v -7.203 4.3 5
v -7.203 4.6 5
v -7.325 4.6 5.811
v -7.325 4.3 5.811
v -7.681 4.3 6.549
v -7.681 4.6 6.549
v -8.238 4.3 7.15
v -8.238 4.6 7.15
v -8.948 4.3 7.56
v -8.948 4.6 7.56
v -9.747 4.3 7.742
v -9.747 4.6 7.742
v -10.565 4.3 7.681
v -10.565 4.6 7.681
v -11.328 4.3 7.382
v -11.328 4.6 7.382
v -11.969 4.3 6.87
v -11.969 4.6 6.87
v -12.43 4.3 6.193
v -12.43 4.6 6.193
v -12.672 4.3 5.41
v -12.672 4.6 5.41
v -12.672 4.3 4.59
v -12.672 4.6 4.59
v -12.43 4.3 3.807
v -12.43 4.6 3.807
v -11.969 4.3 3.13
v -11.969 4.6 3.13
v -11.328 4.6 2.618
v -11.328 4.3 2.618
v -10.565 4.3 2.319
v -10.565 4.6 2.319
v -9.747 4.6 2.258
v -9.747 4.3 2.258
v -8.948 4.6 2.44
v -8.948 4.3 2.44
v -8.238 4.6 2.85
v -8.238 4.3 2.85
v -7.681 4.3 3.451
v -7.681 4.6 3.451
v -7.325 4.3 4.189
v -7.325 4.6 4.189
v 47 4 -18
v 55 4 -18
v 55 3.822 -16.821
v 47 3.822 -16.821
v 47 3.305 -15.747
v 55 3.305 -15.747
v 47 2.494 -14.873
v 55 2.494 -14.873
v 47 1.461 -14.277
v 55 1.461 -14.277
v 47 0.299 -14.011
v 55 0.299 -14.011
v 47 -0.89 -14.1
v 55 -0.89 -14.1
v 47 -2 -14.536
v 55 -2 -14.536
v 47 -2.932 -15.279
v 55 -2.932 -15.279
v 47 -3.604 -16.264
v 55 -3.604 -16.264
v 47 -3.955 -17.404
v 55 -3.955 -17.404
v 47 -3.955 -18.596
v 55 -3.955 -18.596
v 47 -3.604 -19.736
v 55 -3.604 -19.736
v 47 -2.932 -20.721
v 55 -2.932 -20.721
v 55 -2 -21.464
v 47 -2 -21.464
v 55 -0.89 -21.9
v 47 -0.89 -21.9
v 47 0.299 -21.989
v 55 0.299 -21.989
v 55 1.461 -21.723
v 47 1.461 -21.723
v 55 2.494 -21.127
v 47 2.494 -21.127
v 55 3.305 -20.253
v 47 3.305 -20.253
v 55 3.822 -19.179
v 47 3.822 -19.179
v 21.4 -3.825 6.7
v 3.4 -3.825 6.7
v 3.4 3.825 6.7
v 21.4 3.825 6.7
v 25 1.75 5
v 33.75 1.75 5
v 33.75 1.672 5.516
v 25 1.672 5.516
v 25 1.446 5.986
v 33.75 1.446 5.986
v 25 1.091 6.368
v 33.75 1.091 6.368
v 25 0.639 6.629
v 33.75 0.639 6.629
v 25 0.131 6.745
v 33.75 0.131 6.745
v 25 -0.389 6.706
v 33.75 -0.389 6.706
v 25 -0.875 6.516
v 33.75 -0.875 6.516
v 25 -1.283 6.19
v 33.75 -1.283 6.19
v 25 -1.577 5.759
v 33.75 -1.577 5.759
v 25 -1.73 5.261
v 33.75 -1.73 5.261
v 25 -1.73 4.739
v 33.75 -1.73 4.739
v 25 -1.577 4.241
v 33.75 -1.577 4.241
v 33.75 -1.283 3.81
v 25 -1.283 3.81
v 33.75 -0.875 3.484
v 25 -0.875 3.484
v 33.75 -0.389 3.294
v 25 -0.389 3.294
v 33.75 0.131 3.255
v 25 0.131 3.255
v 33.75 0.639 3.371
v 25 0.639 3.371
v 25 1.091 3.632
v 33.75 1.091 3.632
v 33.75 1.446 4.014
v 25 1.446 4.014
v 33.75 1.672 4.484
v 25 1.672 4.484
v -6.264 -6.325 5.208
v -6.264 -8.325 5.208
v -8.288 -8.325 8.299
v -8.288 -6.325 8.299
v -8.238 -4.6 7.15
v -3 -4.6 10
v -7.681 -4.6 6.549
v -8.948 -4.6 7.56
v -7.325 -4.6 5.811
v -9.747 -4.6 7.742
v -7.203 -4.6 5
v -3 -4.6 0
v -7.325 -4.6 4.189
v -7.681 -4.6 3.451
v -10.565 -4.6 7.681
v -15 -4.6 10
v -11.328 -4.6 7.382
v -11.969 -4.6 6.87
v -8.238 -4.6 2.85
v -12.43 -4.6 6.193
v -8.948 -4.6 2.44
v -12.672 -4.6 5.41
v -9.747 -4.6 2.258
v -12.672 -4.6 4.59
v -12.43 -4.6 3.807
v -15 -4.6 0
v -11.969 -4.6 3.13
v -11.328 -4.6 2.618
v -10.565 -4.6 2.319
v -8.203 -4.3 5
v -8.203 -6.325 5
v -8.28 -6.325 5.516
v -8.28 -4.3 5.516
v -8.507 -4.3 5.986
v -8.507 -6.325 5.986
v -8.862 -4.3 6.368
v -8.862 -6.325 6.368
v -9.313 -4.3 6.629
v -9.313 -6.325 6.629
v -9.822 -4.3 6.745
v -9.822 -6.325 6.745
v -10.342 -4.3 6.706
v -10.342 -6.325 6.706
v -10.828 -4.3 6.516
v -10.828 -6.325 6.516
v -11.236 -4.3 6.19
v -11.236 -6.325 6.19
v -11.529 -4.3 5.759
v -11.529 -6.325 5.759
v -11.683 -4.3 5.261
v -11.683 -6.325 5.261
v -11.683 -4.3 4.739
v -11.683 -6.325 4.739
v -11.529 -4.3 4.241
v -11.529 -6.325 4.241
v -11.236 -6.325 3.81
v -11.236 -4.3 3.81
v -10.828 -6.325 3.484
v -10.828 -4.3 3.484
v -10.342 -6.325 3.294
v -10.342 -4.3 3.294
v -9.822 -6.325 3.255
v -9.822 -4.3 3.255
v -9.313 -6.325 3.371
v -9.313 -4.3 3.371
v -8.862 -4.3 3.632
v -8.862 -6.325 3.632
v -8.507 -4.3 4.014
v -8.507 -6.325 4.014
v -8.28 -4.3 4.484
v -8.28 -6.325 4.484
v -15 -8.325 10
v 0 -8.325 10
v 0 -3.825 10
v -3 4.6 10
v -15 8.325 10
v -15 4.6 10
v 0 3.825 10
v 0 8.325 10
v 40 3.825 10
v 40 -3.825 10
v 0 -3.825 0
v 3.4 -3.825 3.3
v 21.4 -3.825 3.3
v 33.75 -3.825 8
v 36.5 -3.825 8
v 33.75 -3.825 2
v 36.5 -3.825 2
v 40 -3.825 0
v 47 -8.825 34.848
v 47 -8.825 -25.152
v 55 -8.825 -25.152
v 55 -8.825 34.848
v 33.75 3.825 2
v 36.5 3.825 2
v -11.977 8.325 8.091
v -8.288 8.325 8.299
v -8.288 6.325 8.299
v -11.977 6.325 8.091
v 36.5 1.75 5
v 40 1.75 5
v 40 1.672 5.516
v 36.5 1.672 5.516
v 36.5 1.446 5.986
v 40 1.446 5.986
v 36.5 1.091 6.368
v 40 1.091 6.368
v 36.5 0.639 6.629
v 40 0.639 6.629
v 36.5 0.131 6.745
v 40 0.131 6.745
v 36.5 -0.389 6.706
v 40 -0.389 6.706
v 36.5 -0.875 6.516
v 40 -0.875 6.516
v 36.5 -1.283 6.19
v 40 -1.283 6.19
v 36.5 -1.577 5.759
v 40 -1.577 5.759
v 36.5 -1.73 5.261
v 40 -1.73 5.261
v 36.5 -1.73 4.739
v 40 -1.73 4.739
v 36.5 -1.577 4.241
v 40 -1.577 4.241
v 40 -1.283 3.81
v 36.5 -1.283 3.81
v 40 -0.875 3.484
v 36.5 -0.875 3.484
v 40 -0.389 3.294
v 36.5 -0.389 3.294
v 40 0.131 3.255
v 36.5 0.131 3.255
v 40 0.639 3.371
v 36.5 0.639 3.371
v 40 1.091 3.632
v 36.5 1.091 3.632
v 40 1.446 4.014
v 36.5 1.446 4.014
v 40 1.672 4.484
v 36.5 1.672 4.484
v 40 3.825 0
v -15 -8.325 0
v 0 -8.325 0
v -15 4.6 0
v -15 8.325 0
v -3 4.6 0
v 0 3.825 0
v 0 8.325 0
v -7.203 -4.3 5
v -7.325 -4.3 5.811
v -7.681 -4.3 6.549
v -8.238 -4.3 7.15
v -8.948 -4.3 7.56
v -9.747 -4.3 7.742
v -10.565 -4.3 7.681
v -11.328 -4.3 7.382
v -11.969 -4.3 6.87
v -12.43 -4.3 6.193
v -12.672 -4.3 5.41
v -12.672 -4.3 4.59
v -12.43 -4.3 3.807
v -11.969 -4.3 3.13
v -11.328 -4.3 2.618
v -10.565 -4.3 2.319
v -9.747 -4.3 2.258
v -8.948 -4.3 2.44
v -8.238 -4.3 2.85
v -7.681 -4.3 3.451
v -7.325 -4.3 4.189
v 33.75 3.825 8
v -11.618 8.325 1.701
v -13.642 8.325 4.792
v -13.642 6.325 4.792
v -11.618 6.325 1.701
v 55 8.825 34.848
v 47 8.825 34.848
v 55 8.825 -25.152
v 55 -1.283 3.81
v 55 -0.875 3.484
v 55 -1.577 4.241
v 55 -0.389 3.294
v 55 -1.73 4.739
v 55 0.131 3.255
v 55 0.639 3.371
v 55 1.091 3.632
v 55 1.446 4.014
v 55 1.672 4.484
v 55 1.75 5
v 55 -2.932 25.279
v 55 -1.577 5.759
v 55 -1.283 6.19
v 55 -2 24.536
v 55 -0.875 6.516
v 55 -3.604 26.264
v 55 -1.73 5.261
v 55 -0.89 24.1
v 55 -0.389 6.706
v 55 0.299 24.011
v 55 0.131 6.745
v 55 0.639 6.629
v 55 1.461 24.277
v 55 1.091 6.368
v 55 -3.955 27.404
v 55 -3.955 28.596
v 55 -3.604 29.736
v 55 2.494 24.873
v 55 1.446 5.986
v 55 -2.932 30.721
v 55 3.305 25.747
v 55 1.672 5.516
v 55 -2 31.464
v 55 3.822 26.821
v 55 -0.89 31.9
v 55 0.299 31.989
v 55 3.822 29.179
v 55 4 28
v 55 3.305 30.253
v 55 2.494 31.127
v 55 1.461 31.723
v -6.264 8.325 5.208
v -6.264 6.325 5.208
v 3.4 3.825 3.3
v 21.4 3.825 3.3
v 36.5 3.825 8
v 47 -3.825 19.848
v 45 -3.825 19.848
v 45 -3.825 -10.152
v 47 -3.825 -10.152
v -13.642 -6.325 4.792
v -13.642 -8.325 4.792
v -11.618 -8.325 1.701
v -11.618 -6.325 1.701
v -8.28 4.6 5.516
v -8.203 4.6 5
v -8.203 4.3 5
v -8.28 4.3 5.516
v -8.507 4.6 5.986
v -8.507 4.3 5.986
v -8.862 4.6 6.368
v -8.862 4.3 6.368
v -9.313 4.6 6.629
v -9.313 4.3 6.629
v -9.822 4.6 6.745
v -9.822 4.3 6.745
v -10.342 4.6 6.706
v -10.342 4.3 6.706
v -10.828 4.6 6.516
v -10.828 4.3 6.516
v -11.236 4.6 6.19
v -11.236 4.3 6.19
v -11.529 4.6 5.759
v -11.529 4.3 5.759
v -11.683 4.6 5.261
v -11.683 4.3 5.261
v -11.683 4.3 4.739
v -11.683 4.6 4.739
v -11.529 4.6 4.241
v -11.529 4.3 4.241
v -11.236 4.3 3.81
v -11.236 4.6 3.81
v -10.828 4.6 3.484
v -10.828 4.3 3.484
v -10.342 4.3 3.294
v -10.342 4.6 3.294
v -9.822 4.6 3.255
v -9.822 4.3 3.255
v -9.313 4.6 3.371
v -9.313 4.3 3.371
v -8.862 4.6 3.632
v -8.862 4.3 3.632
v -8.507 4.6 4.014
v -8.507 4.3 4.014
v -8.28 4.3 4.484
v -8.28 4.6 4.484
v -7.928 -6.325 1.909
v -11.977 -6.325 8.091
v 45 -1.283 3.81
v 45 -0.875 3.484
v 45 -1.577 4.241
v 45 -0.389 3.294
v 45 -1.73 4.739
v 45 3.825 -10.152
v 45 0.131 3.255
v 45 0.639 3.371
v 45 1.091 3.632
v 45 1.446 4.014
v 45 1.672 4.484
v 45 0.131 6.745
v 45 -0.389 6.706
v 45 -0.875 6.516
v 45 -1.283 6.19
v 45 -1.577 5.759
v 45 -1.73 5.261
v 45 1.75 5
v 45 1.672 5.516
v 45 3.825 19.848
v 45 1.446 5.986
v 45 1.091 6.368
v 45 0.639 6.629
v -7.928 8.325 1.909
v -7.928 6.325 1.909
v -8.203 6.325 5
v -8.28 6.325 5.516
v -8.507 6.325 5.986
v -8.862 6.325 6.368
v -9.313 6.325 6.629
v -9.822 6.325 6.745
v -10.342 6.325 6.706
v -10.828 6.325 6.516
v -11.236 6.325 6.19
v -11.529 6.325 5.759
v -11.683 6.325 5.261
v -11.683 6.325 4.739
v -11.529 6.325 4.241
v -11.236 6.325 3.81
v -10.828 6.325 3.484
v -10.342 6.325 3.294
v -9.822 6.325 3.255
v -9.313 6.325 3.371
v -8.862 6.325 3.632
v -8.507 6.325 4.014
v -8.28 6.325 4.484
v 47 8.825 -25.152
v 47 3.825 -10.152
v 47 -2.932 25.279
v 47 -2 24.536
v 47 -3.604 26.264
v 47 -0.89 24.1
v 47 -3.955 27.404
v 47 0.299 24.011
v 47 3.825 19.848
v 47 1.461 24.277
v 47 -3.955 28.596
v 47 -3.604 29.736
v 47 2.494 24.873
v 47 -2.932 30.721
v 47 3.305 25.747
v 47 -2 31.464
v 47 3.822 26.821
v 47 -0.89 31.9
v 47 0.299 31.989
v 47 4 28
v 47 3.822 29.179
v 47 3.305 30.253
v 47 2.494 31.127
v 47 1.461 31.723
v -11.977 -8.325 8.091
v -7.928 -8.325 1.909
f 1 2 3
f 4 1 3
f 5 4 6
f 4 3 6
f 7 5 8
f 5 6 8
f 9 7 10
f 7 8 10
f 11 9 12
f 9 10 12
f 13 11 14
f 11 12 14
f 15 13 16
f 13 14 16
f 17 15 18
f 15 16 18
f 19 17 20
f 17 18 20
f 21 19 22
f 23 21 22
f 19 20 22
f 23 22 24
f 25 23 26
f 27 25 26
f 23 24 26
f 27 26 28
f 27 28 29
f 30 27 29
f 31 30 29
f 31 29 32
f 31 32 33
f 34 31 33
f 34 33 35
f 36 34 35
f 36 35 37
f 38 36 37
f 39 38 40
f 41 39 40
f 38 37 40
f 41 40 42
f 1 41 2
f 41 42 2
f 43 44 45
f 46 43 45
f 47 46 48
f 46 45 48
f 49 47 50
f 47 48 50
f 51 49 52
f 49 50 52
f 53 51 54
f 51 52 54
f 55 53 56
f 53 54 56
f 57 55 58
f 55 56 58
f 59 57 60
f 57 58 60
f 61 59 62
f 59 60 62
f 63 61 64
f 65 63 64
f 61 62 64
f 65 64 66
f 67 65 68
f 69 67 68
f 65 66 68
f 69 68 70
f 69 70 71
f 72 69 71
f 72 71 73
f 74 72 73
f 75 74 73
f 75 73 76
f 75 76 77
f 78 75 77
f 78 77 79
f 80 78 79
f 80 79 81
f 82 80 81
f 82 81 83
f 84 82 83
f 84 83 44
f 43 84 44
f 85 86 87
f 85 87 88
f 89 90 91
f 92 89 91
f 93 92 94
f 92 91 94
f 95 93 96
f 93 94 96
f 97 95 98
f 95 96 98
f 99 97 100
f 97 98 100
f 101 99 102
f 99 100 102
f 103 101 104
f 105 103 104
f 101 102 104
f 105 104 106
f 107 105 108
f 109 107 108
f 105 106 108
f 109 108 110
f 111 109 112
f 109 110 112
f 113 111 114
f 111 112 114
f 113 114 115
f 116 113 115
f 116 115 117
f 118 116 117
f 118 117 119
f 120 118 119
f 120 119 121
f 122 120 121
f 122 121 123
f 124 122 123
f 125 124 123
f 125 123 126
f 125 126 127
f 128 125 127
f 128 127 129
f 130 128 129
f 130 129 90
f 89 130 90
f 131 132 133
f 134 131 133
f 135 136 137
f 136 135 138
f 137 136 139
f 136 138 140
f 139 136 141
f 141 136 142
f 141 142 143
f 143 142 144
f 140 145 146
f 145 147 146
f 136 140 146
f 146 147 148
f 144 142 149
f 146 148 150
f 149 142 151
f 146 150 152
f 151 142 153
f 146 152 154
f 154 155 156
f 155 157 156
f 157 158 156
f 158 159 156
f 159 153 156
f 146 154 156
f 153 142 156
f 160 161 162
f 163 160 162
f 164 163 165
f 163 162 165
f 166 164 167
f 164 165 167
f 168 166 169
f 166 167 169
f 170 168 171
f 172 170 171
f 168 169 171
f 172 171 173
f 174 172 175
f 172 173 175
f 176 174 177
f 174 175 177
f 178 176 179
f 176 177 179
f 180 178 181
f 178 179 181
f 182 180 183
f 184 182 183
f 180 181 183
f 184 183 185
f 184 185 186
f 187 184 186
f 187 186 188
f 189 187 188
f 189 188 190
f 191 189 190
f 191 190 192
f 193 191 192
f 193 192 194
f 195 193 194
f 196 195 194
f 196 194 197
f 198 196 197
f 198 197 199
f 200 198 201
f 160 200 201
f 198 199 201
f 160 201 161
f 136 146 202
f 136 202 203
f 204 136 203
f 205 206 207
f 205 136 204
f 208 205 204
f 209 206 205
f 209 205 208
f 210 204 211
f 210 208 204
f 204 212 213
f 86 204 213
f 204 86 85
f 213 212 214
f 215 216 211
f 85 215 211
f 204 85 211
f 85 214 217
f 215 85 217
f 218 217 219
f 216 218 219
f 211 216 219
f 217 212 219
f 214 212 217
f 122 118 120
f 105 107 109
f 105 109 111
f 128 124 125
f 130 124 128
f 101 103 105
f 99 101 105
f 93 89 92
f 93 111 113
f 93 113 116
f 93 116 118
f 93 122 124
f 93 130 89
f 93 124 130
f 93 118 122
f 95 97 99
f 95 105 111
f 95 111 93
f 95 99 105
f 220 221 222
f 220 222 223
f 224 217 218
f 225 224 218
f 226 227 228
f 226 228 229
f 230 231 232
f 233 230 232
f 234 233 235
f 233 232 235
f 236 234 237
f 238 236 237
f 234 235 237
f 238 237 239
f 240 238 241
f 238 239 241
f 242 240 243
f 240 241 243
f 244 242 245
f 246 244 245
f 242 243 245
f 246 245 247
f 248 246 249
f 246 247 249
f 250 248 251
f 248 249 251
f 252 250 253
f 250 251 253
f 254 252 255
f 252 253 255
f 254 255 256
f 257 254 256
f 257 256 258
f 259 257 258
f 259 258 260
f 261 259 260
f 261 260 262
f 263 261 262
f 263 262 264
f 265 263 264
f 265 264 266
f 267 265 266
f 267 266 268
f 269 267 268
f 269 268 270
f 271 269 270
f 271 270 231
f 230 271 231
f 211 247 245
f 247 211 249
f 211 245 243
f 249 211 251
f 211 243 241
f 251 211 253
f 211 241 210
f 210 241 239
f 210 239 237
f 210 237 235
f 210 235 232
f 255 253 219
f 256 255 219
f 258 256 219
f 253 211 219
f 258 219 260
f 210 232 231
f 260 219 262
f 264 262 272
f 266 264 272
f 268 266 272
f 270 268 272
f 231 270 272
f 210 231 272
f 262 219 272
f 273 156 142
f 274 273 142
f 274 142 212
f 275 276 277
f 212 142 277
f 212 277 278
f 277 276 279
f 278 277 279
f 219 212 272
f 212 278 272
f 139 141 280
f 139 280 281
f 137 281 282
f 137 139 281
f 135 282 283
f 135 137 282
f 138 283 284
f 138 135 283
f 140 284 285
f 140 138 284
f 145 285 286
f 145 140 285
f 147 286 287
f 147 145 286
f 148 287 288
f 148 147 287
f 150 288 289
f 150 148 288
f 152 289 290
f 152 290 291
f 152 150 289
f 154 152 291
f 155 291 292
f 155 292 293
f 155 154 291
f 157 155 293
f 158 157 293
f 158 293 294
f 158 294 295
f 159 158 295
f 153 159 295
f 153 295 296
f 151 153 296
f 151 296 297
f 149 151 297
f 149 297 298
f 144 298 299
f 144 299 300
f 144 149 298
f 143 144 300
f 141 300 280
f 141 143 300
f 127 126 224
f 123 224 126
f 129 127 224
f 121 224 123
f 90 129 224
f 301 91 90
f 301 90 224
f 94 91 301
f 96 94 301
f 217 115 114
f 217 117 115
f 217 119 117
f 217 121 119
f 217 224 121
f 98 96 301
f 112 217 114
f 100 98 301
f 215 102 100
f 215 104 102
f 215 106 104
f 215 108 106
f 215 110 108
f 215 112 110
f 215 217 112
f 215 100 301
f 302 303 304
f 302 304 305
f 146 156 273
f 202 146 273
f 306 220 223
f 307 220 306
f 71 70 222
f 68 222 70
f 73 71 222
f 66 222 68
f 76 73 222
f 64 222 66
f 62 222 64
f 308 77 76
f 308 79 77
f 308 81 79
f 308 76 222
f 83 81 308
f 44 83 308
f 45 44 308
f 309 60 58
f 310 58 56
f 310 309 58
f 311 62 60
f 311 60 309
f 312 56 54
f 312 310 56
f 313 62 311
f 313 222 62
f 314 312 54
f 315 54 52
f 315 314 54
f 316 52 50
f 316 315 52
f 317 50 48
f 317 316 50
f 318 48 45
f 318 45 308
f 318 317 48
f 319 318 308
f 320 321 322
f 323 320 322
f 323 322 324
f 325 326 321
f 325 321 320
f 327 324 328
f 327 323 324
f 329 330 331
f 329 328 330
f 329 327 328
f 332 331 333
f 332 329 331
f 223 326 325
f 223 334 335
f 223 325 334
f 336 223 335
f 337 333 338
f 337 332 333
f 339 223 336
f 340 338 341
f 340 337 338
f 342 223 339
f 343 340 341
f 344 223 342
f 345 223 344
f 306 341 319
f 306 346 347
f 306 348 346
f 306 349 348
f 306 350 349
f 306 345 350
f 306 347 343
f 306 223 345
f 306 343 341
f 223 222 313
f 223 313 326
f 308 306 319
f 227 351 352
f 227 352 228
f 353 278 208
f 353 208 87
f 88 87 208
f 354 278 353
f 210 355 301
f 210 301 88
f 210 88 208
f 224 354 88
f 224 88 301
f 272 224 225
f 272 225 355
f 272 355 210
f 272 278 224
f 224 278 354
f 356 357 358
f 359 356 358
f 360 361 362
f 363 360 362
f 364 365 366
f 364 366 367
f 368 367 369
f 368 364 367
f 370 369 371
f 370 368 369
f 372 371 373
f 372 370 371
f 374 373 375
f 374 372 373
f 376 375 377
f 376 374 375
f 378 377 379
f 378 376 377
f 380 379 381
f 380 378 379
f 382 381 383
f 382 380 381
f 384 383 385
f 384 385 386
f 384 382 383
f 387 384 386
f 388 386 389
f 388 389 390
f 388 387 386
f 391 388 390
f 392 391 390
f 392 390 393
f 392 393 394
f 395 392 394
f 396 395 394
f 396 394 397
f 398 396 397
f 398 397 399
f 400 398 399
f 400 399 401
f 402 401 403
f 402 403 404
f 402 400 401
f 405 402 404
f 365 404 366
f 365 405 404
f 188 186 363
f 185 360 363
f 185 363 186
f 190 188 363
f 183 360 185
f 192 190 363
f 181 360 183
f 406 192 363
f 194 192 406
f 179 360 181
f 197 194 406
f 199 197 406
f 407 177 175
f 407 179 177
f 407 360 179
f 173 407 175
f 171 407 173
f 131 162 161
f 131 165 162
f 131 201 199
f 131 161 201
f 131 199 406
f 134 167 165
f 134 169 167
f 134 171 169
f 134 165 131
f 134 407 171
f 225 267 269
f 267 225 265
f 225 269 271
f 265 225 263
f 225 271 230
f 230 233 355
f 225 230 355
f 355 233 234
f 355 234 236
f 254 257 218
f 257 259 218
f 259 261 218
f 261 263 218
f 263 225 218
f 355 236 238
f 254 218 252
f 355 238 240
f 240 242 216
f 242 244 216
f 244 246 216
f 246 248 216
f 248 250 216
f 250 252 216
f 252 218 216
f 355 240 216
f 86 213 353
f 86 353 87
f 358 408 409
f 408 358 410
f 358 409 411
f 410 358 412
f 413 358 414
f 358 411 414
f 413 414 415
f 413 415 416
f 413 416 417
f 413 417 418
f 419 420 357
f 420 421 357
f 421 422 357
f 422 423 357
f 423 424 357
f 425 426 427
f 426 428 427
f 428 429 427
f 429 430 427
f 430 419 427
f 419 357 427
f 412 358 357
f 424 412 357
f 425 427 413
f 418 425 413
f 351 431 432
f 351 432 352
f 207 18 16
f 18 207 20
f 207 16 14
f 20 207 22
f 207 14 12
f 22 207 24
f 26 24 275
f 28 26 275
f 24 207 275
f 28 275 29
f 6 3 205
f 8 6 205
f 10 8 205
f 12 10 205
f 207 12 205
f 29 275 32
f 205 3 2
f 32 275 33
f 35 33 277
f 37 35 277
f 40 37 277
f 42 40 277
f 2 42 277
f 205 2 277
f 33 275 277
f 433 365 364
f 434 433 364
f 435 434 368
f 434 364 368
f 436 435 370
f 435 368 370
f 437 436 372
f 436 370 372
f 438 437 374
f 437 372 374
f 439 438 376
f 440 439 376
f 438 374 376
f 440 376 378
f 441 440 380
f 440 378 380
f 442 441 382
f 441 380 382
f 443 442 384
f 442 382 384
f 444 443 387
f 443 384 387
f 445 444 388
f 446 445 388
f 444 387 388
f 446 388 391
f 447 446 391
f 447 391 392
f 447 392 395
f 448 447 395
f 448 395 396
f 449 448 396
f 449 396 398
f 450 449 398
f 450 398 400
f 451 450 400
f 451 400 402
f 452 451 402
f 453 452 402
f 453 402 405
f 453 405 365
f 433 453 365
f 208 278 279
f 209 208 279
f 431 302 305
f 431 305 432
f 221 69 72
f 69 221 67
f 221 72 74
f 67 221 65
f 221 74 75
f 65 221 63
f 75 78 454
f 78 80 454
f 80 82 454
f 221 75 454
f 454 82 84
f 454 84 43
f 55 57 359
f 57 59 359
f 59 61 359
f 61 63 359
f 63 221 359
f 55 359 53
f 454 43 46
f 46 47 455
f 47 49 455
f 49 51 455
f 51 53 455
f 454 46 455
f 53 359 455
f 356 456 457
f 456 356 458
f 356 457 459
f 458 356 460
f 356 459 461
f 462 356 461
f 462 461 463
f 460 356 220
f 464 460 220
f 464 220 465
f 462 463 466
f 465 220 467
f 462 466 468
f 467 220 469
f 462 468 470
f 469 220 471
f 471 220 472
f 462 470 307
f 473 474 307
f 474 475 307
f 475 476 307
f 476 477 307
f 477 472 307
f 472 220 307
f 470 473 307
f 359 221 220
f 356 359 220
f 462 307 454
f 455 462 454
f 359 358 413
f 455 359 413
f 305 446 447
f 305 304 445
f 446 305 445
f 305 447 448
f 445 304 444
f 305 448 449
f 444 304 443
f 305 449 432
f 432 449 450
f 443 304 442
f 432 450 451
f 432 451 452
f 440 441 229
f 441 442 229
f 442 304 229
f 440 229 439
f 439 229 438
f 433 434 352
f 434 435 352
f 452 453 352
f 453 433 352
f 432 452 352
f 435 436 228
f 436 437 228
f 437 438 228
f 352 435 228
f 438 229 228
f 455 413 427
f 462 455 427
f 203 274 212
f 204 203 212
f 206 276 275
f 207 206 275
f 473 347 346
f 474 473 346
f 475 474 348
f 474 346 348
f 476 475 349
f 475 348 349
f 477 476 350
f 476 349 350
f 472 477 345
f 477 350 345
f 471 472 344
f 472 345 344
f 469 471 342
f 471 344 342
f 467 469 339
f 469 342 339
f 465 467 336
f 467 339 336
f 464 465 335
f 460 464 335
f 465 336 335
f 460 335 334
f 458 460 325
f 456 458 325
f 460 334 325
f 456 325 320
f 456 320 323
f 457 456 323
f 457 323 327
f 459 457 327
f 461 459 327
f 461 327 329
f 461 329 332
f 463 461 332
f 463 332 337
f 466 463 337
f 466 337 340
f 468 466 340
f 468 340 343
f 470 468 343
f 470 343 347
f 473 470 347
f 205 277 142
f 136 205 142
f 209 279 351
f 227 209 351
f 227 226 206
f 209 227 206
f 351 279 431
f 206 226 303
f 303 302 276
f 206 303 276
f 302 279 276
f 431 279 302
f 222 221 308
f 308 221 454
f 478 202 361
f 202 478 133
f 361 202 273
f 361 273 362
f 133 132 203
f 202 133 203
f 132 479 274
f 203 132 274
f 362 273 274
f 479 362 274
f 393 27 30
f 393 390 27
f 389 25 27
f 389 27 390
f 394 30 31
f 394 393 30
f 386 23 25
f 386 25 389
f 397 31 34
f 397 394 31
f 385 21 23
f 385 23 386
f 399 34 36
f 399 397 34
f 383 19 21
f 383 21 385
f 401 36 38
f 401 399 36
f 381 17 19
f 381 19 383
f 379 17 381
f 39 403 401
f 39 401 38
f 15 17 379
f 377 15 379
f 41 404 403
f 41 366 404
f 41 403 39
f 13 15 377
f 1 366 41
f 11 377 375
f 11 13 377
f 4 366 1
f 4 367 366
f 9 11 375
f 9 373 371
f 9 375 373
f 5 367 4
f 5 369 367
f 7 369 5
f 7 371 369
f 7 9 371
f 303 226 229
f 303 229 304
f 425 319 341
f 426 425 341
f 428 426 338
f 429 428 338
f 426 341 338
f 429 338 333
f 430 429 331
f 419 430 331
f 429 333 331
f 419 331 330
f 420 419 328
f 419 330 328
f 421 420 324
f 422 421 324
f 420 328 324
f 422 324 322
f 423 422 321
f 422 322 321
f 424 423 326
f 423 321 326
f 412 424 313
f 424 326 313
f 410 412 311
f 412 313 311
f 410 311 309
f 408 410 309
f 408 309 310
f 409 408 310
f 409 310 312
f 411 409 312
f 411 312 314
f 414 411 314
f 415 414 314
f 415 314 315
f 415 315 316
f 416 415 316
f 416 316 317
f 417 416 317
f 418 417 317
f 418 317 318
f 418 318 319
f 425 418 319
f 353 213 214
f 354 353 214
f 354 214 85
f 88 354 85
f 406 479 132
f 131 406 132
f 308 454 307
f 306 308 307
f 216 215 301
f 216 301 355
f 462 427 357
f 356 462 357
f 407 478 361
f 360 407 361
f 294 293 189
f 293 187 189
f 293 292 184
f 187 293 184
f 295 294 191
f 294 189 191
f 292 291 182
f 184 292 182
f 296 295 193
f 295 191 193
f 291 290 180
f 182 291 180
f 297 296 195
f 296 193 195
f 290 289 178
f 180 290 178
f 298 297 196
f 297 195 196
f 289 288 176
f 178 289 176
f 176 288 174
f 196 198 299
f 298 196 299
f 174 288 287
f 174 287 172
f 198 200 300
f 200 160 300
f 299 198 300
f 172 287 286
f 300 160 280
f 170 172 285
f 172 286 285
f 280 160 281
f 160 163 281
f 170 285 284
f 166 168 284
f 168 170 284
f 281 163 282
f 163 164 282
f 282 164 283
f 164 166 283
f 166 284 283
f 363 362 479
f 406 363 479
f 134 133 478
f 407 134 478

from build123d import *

# Parameters (mm, degrees)
F0_W      = 40
F0_H      = 3.825
F1_DEPTH  = 10
F2_R      = 1.75
F3_DEPTH  = 16.651
F4_W      = 18
F4_H      = 3.4
F4_W_2    = 2.75
F4_H_2    = 6
F5_DEPTH  = 12.151
F6_R      = 1.75
F7_DEPTH  = 15
F10_DEPTH = 2
F11_W     = 17.65
F11_H     = 60
F12_DEPTH = 8
F13_R     = 1.75
F14_DEPTH = 70.001
F15_R     = 2.75
F15_R_2   = 1.75
F16_DEPTH = 0.3
F17_R     = 1.75
F18_DEPTH = 2
F20_D     = 8


# Not quite as in the source:
# - a pattern or mirror of a feature is missing from the dataset's text; its kind, count and spacing are read off the source's solid


with BuildPart() as f1:
    # F0 (on Top) → F1 (new body)
    with BuildSketch(Plane.XY):
        Polygon((0, -3.825), (0, 0), (-3, 0), (-3, -4.6), (-15, -4.6), (-15, -8.325), (0, -8.325), align=None)
        Polygon((-3, 0), (0, 0), (0, 3.825), (0, 8.325), (-15, 8.325), (-15, 4.6), (-3, 4.6), align=None)
        with Locations((20, 1.9125)):
            Rectangle(F0_W, F0_H)
        with Locations((20, -1.9125)):
            Rectangle(F0_W, F0_H)
    extrude(amount=F1_DEPTH)

    # F2 (on face) → F3 (cut, through all)
    with BuildSketch(Plane.XZ.offset(8.325)):
        with Locations((-9.9527407438, 5)):
            Circle(F2_R)
    extrude(amount=-F3_DEPTH, mode=Mode.SUBTRACT)

    # F4 (on face) → F5 (cut, through all)
    with BuildSketch(Plane.XZ.offset(3.825)):
        with Locations((12.4002694301, 5)):
            Rectangle(F4_W, F4_H)
        with Locations((35.125, 5)):
            Rectangle(F4_W_2, F4_H_2)
    extrude(amount=-F5_DEPTH, mode=Mode.SUBTRACT)

    # F6 (on face) → F7 (cut)
    with BuildSketch(Plane.YZ.offset(40)):
        with Locations((0, 5)):
            Circle(F6_R)
    extrude(amount=-F7_DEPTH, mode=Mode.SUBTRACT)

    # F15 (on face) → F16 (join)
    with BuildSketch(Plane.XZ.offset(-4.6)):
        with Locations((-9.9527407438, 5)):
            Circle(F15_R)
        with Locations((-9.9527407438, 5)):
            Circle(F15_R_2, mode=Mode.SUBTRACT)
    f16 = extrude(amount=F16_DEPTH)

    # F16_copies: F16 across plane
    add(f16.mirror(Plane(origin=(0, 0, 0), x_dir=(0, 0, -1), z_dir=(0, -1, 0))))

    # F17 (on face) → F18 (cut)
    with BuildSketch(Plane.XZ.offset(8.325)):
        Polygon((-7.9284293953, 1.9088033227), (-6.2635302189, 5.2075067143), (-8.2878415673, 8.2987033916), (-11.9770520922, 8.0911966773), (-13.6419512686, 4.7924932857), (-11.6176399202, 1.7012966084), align=None)
        with Locations((-9.9527407438, 5)):
            Circle(F17_R, mode=Mode.SUBTRACT)
    f18 = extrude(amount=-F18_DEPTH, mode=Mode.SUBTRACT)

    # F18_copies: F18 across plane
    add(f18.mirror(Plane.ZX), mode=Mode.SUBTRACT)


with BuildPart() as f10:
    # F9 (on offset) → F10 (new body)
    with BuildSketch(Plane.YZ.offset(45)):
        Polygon((3.825, 0), (3.825, 10), (3.825, 19.8484882712), (-3.825, 19.8484882712), (-3.825, 10), (-3.825, 0), (-3.825, -10.1515117288), (3.825, -10.1515117288), align=None)
    extrude(amount=F10_DEPTH)

    # F11 (on face) → F12 (join)
    with BuildSketch(Plane.YZ.offset(47)):
        with Locations((0, 4.8484882712)):
            Rectangle(F11_W, F11_H)
    extrude(amount=F12_DEPTH)

    # F13 (on face) → F14 (cut, through all)
    with BuildSketch(Plane.YZ.offset(55)):
        with Locations((0, 5)):
            Circle(F13_R)
    extrude(amount=-F14_DEPTH, mode=Mode.SUBTRACT)

    # F20 (through all)
    with Locations(Plane(origin=(47, 0, 0), x_dir=(0, -1, 0), z_dir=(-1, 0, 0))):
        with Locations((0, -18), (0, 28)):
            Hole(F20_D / 2)


solid = Compound([f1.part, f10.part])
